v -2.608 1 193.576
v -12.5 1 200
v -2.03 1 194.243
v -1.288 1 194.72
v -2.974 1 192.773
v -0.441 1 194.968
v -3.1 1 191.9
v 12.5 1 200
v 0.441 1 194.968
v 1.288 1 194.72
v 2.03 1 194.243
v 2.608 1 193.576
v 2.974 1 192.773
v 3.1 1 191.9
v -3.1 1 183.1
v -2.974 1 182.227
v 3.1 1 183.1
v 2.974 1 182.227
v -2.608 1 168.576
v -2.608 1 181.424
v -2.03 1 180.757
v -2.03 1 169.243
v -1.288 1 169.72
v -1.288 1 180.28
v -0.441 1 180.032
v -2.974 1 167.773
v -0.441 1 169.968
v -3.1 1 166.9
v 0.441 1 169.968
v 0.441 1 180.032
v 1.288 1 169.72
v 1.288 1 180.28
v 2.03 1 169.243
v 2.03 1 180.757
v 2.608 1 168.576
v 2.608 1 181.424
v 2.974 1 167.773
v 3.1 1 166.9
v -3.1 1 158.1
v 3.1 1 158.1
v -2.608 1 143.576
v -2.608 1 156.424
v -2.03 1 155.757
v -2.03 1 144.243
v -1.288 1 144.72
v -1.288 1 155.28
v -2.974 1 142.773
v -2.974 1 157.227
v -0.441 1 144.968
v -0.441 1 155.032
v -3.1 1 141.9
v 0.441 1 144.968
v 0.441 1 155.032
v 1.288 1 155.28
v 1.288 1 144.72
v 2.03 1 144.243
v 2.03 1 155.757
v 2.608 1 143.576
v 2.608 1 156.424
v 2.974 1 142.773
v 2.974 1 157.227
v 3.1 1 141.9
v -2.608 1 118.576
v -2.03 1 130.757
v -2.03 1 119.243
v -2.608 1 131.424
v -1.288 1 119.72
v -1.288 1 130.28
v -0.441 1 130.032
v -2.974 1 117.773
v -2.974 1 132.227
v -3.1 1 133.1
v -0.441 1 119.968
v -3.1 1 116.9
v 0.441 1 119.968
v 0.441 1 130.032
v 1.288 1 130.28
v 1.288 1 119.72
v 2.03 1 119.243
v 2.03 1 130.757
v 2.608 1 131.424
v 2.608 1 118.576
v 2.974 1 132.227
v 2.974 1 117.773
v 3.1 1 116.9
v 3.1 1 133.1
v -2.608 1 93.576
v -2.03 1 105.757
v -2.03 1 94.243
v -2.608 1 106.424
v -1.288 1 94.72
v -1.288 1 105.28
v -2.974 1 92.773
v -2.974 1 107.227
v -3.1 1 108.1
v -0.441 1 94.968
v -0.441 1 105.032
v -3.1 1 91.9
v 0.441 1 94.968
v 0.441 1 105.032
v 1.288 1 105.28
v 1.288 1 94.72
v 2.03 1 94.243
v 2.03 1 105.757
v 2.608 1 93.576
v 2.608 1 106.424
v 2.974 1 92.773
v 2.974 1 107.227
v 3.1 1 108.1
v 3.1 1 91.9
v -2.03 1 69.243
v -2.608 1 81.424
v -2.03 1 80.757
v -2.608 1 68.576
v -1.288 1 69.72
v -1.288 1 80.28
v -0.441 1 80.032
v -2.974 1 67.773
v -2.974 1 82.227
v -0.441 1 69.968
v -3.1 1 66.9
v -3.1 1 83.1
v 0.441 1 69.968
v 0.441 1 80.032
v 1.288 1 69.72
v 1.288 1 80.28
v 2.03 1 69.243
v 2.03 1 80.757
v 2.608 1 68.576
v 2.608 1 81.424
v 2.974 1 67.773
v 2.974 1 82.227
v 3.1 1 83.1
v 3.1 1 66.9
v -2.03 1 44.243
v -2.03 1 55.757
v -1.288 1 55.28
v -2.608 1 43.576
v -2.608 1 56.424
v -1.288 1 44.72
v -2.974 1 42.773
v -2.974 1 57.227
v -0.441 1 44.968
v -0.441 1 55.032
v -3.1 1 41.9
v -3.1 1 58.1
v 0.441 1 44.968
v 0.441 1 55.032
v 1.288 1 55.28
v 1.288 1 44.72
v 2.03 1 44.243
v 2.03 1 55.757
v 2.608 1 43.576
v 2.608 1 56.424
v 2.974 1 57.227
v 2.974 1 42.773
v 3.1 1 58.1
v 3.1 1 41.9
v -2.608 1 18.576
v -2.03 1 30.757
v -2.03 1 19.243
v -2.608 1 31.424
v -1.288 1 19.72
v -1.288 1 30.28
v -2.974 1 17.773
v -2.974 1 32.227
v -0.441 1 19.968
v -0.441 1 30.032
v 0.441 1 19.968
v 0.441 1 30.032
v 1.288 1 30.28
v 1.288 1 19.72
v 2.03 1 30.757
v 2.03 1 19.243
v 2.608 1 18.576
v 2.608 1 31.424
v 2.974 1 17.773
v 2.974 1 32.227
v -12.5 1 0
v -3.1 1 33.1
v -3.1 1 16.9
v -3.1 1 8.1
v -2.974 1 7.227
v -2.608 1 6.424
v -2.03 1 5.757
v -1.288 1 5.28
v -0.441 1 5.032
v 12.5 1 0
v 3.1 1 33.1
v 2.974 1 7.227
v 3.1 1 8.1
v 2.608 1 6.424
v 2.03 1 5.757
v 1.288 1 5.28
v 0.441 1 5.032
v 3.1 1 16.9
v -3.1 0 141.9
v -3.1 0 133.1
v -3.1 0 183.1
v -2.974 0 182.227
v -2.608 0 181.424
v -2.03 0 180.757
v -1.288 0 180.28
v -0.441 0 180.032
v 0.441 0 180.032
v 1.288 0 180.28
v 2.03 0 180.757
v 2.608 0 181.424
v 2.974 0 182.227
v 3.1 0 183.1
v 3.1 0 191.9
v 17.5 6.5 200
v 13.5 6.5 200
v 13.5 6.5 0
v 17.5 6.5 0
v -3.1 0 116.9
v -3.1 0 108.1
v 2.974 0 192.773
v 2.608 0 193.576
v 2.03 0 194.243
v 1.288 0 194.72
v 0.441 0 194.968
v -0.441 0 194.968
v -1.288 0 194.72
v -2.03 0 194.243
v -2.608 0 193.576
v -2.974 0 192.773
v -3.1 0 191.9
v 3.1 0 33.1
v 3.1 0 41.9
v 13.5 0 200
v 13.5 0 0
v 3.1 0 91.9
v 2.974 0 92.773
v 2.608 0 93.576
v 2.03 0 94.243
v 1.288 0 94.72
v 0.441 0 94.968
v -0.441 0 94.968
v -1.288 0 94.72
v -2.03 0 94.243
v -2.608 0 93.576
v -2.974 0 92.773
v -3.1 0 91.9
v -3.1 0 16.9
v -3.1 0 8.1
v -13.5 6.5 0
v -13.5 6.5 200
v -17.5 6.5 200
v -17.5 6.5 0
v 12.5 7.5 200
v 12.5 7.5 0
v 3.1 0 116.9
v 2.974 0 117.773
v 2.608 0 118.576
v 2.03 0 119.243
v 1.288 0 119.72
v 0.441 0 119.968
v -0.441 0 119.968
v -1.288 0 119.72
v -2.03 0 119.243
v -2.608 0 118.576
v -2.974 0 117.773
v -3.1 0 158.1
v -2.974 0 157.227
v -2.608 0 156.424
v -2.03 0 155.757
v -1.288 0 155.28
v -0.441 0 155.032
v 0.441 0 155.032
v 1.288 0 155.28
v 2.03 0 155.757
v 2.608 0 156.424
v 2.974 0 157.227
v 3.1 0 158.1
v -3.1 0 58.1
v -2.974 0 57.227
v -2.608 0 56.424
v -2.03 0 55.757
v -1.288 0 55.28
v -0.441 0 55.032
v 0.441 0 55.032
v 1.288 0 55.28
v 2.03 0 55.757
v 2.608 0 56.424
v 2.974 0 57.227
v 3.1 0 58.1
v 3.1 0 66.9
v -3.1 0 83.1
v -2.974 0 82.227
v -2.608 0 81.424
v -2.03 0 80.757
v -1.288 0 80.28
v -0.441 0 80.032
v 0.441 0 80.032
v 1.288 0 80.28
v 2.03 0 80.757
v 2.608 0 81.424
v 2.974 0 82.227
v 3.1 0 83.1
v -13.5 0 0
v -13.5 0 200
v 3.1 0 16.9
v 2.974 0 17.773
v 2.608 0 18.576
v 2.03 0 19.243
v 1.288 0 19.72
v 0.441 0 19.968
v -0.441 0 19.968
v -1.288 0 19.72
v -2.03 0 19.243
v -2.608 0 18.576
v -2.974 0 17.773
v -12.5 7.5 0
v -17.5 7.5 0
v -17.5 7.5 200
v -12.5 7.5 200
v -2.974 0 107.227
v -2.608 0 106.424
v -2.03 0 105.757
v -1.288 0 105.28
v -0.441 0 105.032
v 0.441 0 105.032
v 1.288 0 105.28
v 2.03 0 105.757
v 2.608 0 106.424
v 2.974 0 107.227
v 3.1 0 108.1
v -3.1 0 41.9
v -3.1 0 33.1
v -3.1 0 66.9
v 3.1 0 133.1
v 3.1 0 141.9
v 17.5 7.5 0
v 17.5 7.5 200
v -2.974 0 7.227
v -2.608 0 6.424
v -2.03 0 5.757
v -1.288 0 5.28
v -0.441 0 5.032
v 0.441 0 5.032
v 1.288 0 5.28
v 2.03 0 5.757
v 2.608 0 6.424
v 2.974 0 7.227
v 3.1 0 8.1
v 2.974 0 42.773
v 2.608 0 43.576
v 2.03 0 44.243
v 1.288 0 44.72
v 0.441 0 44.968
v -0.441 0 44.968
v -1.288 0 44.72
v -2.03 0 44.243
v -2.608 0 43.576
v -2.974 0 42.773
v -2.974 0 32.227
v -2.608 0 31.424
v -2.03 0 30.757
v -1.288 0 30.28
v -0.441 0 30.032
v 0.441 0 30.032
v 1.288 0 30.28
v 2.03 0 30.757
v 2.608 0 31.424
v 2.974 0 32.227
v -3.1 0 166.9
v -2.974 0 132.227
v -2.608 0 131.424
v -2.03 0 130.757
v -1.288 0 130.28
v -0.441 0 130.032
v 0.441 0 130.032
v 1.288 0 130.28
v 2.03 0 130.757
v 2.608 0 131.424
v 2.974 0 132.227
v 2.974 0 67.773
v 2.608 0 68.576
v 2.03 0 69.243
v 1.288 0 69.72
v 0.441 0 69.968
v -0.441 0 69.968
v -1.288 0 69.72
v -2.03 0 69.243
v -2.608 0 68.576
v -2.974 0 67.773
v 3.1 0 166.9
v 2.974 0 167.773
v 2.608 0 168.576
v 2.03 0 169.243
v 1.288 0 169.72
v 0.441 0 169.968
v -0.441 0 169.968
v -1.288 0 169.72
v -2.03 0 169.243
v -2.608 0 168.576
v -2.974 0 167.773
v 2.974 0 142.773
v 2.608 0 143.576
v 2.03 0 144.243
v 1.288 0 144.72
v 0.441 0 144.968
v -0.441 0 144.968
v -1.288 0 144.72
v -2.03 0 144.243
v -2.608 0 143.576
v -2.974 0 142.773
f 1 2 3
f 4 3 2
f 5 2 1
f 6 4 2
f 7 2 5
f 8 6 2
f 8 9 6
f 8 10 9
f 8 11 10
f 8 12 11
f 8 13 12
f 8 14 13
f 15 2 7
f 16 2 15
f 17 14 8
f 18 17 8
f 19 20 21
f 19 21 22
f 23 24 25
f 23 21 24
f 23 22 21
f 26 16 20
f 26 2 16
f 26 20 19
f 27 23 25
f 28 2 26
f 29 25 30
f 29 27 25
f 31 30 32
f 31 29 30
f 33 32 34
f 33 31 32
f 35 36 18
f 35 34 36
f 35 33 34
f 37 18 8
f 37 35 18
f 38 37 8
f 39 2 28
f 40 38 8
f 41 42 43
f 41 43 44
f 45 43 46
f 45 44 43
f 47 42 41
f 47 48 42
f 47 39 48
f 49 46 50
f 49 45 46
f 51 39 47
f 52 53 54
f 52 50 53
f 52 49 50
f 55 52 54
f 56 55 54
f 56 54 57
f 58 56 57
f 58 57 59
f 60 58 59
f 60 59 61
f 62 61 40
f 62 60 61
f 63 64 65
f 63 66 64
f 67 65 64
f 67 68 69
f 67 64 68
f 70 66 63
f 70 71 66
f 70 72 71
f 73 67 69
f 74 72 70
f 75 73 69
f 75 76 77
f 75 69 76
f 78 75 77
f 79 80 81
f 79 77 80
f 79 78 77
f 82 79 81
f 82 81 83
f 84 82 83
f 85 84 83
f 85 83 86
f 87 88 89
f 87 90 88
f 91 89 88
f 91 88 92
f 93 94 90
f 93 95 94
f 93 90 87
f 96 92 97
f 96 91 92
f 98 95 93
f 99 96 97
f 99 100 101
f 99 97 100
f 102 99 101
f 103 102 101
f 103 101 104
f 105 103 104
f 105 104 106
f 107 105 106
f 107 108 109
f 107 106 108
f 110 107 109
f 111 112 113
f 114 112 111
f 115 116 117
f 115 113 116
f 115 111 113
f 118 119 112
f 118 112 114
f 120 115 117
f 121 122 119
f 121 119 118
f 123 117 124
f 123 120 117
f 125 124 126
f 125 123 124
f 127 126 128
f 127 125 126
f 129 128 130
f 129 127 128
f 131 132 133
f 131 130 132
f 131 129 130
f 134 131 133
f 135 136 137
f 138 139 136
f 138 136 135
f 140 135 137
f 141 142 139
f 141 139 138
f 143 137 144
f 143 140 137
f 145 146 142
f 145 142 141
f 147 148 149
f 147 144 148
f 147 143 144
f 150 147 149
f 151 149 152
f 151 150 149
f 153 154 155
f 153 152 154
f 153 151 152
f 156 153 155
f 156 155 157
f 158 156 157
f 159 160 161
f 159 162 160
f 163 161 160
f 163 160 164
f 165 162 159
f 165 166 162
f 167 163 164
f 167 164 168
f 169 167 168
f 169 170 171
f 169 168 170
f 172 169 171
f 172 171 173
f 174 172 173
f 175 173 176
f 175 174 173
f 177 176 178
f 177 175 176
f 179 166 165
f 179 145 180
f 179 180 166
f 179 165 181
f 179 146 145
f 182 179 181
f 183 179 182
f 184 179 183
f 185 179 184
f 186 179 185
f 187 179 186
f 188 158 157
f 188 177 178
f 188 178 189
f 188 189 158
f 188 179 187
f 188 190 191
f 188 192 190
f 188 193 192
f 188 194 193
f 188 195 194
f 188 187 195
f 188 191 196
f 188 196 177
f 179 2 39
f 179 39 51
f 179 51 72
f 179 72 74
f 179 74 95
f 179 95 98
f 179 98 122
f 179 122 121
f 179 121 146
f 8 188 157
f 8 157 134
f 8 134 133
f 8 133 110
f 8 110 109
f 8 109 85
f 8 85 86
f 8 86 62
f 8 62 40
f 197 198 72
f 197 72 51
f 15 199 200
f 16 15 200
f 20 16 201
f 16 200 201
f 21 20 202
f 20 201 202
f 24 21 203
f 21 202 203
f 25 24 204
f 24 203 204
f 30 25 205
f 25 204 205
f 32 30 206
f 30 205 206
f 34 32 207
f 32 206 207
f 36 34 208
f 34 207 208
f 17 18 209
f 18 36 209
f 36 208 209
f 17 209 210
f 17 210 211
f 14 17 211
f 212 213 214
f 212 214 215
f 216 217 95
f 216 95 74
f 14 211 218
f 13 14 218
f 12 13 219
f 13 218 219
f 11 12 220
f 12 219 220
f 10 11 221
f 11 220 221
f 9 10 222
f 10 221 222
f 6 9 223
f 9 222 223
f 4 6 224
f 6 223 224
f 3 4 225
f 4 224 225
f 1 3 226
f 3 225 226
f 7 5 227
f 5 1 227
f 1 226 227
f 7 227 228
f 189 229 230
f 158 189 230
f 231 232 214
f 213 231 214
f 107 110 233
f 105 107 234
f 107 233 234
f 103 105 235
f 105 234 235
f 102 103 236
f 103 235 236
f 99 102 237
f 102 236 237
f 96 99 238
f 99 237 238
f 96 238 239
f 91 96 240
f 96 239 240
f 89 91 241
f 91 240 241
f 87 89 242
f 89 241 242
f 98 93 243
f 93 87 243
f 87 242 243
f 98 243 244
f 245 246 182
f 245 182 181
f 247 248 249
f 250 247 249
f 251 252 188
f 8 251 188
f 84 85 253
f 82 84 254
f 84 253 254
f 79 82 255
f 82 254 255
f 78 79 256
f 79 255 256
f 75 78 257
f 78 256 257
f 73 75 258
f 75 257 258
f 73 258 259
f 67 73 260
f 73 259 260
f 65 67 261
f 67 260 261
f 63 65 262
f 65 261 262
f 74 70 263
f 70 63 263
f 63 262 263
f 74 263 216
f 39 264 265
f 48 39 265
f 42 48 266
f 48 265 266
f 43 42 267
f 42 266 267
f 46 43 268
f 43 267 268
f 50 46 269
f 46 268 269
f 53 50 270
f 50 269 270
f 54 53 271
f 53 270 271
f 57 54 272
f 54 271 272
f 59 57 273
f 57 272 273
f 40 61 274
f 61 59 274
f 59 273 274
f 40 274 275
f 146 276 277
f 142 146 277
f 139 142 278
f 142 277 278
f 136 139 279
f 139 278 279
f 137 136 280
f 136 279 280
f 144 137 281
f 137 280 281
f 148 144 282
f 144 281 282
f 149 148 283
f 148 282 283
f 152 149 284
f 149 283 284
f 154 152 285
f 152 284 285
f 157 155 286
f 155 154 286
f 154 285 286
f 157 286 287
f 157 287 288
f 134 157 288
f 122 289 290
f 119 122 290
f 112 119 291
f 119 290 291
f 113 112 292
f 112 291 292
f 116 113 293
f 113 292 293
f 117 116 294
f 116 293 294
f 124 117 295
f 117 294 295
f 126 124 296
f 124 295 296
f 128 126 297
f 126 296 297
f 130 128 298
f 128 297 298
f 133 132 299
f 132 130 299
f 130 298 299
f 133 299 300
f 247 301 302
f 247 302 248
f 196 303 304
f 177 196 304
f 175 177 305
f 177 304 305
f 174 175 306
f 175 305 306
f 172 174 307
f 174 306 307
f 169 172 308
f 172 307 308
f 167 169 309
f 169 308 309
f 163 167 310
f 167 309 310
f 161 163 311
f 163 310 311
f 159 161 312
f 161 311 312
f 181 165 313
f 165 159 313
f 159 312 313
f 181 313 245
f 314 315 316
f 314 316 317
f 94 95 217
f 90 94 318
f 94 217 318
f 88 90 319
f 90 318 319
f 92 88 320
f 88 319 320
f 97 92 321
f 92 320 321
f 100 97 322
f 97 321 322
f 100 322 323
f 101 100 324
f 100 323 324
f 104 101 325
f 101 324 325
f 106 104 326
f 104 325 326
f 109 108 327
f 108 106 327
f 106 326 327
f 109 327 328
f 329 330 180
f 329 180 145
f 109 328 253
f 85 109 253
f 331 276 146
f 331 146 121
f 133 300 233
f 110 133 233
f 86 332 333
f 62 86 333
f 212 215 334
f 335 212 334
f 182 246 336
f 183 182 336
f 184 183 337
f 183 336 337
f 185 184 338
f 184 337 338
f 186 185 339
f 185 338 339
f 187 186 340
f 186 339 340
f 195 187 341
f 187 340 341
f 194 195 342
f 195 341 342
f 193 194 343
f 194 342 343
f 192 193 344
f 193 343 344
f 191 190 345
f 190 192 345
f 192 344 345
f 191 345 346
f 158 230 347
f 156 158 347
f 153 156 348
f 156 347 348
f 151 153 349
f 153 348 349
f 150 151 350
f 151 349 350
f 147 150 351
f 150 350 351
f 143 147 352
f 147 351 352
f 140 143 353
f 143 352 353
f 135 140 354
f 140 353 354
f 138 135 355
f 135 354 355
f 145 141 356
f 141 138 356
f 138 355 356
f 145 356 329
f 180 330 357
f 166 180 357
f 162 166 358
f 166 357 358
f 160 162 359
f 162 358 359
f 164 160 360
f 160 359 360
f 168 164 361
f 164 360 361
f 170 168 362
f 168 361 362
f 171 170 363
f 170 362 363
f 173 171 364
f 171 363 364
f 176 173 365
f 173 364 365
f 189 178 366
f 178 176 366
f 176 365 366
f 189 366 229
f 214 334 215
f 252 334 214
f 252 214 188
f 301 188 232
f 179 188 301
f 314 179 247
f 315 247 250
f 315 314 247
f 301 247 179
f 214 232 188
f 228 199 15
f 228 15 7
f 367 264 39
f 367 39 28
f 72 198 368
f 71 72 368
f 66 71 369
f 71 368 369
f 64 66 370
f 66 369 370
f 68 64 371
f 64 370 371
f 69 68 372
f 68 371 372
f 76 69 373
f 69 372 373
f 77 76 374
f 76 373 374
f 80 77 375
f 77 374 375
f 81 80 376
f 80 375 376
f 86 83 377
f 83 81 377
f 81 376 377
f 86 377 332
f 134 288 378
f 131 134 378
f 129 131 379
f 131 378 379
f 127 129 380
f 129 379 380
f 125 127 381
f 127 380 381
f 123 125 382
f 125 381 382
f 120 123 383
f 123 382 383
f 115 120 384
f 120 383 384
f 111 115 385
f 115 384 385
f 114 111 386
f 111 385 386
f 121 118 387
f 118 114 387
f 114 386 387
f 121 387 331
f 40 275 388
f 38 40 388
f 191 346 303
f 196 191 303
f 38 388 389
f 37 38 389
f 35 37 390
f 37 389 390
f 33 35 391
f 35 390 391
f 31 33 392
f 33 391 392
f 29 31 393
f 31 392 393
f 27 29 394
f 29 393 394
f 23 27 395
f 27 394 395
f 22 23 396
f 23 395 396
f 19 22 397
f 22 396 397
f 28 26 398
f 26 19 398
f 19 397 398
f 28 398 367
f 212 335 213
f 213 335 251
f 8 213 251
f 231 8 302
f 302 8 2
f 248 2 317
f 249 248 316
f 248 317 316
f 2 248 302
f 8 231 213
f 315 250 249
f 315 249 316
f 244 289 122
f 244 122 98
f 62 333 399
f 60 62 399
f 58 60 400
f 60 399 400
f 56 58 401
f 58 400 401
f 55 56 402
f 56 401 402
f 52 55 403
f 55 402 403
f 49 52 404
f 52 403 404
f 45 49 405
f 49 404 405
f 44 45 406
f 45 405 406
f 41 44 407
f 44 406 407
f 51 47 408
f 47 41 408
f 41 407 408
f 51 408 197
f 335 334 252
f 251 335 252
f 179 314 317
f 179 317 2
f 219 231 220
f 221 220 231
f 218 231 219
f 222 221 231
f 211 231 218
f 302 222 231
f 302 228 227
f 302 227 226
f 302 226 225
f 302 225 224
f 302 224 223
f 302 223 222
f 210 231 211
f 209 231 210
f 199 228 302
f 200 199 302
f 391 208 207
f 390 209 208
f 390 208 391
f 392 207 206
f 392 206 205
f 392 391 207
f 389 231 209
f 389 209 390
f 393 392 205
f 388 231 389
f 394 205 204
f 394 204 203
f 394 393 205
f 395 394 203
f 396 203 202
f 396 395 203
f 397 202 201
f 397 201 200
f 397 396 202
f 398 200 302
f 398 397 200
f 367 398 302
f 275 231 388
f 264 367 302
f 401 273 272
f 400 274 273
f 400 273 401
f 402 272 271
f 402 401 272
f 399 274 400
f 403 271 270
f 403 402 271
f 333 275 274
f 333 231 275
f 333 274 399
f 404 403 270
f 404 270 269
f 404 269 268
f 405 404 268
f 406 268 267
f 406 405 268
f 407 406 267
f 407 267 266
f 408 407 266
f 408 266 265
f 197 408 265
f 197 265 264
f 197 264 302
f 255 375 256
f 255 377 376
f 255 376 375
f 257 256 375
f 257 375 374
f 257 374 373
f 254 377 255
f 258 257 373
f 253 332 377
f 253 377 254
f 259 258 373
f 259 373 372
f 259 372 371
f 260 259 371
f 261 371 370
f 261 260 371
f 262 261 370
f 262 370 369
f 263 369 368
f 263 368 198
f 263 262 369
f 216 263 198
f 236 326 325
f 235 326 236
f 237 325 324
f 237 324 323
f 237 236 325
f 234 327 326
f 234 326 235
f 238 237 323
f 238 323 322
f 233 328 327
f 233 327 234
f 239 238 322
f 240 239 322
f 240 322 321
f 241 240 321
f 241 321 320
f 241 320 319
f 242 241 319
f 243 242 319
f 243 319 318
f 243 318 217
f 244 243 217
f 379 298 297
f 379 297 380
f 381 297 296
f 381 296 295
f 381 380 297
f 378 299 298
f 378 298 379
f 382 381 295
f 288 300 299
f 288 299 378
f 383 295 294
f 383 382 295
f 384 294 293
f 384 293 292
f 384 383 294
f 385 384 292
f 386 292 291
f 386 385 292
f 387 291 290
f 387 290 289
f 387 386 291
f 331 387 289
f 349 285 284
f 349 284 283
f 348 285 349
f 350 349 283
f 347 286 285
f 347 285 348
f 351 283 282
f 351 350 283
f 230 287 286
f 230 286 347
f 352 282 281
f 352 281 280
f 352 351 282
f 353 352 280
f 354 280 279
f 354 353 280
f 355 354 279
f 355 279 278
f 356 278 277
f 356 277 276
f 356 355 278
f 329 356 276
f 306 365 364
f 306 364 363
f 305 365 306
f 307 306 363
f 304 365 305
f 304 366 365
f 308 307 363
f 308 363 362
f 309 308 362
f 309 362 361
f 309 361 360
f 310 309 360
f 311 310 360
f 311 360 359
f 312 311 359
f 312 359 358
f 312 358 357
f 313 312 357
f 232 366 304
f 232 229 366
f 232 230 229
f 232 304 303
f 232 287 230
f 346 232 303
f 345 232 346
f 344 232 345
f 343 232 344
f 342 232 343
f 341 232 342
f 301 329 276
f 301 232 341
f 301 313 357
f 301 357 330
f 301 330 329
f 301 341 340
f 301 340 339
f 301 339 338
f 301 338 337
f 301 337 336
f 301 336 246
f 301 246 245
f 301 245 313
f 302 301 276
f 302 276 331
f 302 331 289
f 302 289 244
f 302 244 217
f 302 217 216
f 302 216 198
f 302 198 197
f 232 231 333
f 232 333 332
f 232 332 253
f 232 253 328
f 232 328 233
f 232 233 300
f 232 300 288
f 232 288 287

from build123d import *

# Parameters (mm, degrees)
BOSS_EXTRUDE1_DEPTH  = 200
CUT_EXTRUDE1_DEPTH   = 201.904206029
LPATTERN1_COUNT      = 8
LPATTERN1_PITCH      = 25
MIRROR2_COPY_1_DEPTH = 201.904206029
MIRROR2_COPY_2_DEPTH = 201.904206029
MIRROR2_COPY_3_DEPTH = 201.904206029
MIRROR2_COPY_4_DEPTH = 201.904206029
MIRROR2_COPY_5_DEPTH = 201.904206029
MIRROR2_COPY_6_DEPTH = 201.904206029
MIRROR2_COPY_7_DEPTH = 201.904206029


with BuildPart() as part:
    # Sketch1 → Boss-Extrude1 (new body)
    with BuildSketch(Plane.XY):
        Polygon((0, 0), (13.5, 0), (13.5, 6.5), (17.5, 6.5), (17.5, 7.5), (12.5, 7.5), (12.5, 1), (0, 1), align=None)
    boss_extrude1 = extrude(amount=BOSS_EXTRUDE1_DEPTH)

    # Sketch2 → Cut-Extrude1 (cut, through all)
    with BuildSketch(Plane(origin=(0, 0, 0), x_dir=(1, 0, 0), z_dir=(0, 1, 0))):
        with BuildLine():
            Line((3.1, -8.1), (3.1, -16.9))
            ThreePointArc((3.1, -16.9), (0, -20), (-3.1, -16.9))
            Line((-3.1, -16.9), (-3.1, -8.1))
            ThreePointArc((-3.1, -8.1), (0, -5), (3.1, -8.1))
        make_face()
    cut_extrude1 = extrude(amount=CUT_EXTRUDE1_DEPTH, mode=Mode.SUBTRACT)

    # LPattern1: Cut-Extrude1 ×8
    with Locations(*[(0, 0, i * LPATTERN1_PITCH) for i in range(1, LPATTERN1_COUNT)]):
        add(cut_extrude1, mode=Mode.SUBTRACT)

    # Mirror2: Boss-Extrude1, Cut-Extrude1 across plane
    add(boss_extrude1.mirror(Plane(origin=(0, 0, 0), x_dir=(0, 0, 1), z_dir=(1, 0, 0))))
    add(cut_extrude1.mirror(Plane(origin=(0, 0, 0), x_dir=(0, 0, 1), z_dir=(1, 0, 0))), mode=Mode.SUBTRACT)

    # Mirror2 copy 1 sketch → Mirror2 copy 1 (cut, through all)
    with BuildSketch(Plane(origin=(0, 0, 25), x_dir=(-1, 0, 0), z_dir=(0, 1, 0))):
        with BuildLine():
            Line((3.1, 8.1), (3.1, 16.9))
            ThreePointArc((3.1, 16.9), (0, 20), (-3.1, 16.9))
            Line((-3.1, 16.9), (-3.1, 8.1))
            ThreePointArc((-3.1, 8.1), (0, 5), (3.1, 8.1))
        make_face()
    extrude(amount=MIRROR2_COPY_1_DEPTH, mode=Mode.SUBTRACT)

    # Mirror2 copy 2 sketch → Mirror2 copy 2 (cut, through all)
    with BuildSketch(Plane(origin=(0, 0, 50), x_dir=(-1, 0, 0), z_dir=(0, 1, 0))):
        with BuildLine():
            Line((3.1, 8.1), (3.1, 16.9))
            ThreePointArc((3.1, 16.9), (0, 20), (-3.1, 16.9))
            Line((-3.1, 16.9), (-3.1, 8.1))
            ThreePointArc((-3.1, 8.1), (0, 5), (3.1, 8.1))
        make_face()
    extrude(amount=MIRROR2_COPY_2_DEPTH, mode=Mode.SUBTRACT)

    # Mirror2 copy 3 sketch → Mirror2 copy 3 (cut, through all)
    with BuildSketch(Plane(origin=(0, 0, 75), x_dir=(-1, 0, 0), z_dir=(0, 1, 0))):
        with BuildLine():
            Line((3.1, 8.1), (3.1, 16.9))
            ThreePointArc((3.1, 16.9), (0, 20), (-3.1, 16.9))
            Line((-3.1, 16.9), (-3.1, 8.1))
            ThreePointArc((-3.1, 8.1), (0, 5), (3.1, 8.1))
        make_face()
    extrude(amount=MIRROR2_COPY_3_DEPTH, mode=Mode.SUBTRACT)

    # Mirror2 copy 4 sketch → Mirror2 copy 4 (cut, through all)
    with BuildSketch(Plane(origin=(0, 0, 100), x_dir=(-1, 0, 0), z_dir=(0, 1, 0))):
        with BuildLine():
            Line((3.1, 8.1), (3.1, 16.9))
            ThreePointArc((3.1, 16.9), (0, 20), (-3.1, 16.9))
            Line((-3.1, 16.9), (-3.1, 8.1))
            ThreePointArc((-3.1, 8.1), (0, 5), (3.1, 8.1))
        make_face()
    extrude(amount=MIRROR2_COPY_4_DEPTH, mode=Mode.SUBTRACT)

    # Mirror2 copy 5 sketch → Mirror2 copy 5 (cut, through all)
    with BuildSketch(Plane(origin=(0, 0, 125), x_dir=(-1, 0, 0), z_dir=(0, 1, 0))):
        with BuildLine():
            Line((3.1, 8.1), (3.1, 16.9))
            ThreePointArc((3.1, 16.9), (0, 20), (-3.1, 16.9))
            Line((-3.1, 16.9), (-3.1, 8.1))
            ThreePointArc((-3.1, 8.1), (0, 5), (3.1, 8.1))
        make_face()
    extrude(amount=MIRROR2_COPY_5_DEPTH, mode=Mode.SUBTRACT)

    # Mirror2 copy 6 sketch → Mirror2 copy 6 (cut, through all)
    with BuildSketch(Plane(origin=(0, 0, 150), x_dir=(-1, 0, 0), z_dir=(0, 1, 0))):
        with BuildLine():
            Line((3.1, 8.1), (3.1, 16.9))
            ThreePointArc((3.1, 16.9), (0, 20), (-3.1, 16.9))
            Line((-3.1, 16.9), (-3.1, 8.1))
            ThreePointArc((-3.1, 8.1), (0, 5), (3.1, 8.1))
        make_face()
    extrude(amount=MIRROR2_COPY_6_DEPTH, mode=Mode.SUBTRACT)

    # Mirror2 copy 7 sketch → Mirror2 copy 7 (cut, through all)
    with BuildSketch(Plane(origin=(0, 0, 175), x_dir=(-1, 0, 0), z_dir=(0, 1, 0))):
        with BuildLine():
            Line((3.1, 8.1), (3.1, 16.9))
            ThreePointArc((3.1, 16.9), (0, 20), (-3.1, 16.9))
            Line((-3.1, 16.9), (-3.1, 8.1))
            ThreePointArc((-3.1, 8.1), (0, 5), (3.1, 8.1))
        make_face()
    extrude(amount=MIRROR2_COPY_7_DEPTH, mode=Mode.SUBTRACT)


solid = part.part
